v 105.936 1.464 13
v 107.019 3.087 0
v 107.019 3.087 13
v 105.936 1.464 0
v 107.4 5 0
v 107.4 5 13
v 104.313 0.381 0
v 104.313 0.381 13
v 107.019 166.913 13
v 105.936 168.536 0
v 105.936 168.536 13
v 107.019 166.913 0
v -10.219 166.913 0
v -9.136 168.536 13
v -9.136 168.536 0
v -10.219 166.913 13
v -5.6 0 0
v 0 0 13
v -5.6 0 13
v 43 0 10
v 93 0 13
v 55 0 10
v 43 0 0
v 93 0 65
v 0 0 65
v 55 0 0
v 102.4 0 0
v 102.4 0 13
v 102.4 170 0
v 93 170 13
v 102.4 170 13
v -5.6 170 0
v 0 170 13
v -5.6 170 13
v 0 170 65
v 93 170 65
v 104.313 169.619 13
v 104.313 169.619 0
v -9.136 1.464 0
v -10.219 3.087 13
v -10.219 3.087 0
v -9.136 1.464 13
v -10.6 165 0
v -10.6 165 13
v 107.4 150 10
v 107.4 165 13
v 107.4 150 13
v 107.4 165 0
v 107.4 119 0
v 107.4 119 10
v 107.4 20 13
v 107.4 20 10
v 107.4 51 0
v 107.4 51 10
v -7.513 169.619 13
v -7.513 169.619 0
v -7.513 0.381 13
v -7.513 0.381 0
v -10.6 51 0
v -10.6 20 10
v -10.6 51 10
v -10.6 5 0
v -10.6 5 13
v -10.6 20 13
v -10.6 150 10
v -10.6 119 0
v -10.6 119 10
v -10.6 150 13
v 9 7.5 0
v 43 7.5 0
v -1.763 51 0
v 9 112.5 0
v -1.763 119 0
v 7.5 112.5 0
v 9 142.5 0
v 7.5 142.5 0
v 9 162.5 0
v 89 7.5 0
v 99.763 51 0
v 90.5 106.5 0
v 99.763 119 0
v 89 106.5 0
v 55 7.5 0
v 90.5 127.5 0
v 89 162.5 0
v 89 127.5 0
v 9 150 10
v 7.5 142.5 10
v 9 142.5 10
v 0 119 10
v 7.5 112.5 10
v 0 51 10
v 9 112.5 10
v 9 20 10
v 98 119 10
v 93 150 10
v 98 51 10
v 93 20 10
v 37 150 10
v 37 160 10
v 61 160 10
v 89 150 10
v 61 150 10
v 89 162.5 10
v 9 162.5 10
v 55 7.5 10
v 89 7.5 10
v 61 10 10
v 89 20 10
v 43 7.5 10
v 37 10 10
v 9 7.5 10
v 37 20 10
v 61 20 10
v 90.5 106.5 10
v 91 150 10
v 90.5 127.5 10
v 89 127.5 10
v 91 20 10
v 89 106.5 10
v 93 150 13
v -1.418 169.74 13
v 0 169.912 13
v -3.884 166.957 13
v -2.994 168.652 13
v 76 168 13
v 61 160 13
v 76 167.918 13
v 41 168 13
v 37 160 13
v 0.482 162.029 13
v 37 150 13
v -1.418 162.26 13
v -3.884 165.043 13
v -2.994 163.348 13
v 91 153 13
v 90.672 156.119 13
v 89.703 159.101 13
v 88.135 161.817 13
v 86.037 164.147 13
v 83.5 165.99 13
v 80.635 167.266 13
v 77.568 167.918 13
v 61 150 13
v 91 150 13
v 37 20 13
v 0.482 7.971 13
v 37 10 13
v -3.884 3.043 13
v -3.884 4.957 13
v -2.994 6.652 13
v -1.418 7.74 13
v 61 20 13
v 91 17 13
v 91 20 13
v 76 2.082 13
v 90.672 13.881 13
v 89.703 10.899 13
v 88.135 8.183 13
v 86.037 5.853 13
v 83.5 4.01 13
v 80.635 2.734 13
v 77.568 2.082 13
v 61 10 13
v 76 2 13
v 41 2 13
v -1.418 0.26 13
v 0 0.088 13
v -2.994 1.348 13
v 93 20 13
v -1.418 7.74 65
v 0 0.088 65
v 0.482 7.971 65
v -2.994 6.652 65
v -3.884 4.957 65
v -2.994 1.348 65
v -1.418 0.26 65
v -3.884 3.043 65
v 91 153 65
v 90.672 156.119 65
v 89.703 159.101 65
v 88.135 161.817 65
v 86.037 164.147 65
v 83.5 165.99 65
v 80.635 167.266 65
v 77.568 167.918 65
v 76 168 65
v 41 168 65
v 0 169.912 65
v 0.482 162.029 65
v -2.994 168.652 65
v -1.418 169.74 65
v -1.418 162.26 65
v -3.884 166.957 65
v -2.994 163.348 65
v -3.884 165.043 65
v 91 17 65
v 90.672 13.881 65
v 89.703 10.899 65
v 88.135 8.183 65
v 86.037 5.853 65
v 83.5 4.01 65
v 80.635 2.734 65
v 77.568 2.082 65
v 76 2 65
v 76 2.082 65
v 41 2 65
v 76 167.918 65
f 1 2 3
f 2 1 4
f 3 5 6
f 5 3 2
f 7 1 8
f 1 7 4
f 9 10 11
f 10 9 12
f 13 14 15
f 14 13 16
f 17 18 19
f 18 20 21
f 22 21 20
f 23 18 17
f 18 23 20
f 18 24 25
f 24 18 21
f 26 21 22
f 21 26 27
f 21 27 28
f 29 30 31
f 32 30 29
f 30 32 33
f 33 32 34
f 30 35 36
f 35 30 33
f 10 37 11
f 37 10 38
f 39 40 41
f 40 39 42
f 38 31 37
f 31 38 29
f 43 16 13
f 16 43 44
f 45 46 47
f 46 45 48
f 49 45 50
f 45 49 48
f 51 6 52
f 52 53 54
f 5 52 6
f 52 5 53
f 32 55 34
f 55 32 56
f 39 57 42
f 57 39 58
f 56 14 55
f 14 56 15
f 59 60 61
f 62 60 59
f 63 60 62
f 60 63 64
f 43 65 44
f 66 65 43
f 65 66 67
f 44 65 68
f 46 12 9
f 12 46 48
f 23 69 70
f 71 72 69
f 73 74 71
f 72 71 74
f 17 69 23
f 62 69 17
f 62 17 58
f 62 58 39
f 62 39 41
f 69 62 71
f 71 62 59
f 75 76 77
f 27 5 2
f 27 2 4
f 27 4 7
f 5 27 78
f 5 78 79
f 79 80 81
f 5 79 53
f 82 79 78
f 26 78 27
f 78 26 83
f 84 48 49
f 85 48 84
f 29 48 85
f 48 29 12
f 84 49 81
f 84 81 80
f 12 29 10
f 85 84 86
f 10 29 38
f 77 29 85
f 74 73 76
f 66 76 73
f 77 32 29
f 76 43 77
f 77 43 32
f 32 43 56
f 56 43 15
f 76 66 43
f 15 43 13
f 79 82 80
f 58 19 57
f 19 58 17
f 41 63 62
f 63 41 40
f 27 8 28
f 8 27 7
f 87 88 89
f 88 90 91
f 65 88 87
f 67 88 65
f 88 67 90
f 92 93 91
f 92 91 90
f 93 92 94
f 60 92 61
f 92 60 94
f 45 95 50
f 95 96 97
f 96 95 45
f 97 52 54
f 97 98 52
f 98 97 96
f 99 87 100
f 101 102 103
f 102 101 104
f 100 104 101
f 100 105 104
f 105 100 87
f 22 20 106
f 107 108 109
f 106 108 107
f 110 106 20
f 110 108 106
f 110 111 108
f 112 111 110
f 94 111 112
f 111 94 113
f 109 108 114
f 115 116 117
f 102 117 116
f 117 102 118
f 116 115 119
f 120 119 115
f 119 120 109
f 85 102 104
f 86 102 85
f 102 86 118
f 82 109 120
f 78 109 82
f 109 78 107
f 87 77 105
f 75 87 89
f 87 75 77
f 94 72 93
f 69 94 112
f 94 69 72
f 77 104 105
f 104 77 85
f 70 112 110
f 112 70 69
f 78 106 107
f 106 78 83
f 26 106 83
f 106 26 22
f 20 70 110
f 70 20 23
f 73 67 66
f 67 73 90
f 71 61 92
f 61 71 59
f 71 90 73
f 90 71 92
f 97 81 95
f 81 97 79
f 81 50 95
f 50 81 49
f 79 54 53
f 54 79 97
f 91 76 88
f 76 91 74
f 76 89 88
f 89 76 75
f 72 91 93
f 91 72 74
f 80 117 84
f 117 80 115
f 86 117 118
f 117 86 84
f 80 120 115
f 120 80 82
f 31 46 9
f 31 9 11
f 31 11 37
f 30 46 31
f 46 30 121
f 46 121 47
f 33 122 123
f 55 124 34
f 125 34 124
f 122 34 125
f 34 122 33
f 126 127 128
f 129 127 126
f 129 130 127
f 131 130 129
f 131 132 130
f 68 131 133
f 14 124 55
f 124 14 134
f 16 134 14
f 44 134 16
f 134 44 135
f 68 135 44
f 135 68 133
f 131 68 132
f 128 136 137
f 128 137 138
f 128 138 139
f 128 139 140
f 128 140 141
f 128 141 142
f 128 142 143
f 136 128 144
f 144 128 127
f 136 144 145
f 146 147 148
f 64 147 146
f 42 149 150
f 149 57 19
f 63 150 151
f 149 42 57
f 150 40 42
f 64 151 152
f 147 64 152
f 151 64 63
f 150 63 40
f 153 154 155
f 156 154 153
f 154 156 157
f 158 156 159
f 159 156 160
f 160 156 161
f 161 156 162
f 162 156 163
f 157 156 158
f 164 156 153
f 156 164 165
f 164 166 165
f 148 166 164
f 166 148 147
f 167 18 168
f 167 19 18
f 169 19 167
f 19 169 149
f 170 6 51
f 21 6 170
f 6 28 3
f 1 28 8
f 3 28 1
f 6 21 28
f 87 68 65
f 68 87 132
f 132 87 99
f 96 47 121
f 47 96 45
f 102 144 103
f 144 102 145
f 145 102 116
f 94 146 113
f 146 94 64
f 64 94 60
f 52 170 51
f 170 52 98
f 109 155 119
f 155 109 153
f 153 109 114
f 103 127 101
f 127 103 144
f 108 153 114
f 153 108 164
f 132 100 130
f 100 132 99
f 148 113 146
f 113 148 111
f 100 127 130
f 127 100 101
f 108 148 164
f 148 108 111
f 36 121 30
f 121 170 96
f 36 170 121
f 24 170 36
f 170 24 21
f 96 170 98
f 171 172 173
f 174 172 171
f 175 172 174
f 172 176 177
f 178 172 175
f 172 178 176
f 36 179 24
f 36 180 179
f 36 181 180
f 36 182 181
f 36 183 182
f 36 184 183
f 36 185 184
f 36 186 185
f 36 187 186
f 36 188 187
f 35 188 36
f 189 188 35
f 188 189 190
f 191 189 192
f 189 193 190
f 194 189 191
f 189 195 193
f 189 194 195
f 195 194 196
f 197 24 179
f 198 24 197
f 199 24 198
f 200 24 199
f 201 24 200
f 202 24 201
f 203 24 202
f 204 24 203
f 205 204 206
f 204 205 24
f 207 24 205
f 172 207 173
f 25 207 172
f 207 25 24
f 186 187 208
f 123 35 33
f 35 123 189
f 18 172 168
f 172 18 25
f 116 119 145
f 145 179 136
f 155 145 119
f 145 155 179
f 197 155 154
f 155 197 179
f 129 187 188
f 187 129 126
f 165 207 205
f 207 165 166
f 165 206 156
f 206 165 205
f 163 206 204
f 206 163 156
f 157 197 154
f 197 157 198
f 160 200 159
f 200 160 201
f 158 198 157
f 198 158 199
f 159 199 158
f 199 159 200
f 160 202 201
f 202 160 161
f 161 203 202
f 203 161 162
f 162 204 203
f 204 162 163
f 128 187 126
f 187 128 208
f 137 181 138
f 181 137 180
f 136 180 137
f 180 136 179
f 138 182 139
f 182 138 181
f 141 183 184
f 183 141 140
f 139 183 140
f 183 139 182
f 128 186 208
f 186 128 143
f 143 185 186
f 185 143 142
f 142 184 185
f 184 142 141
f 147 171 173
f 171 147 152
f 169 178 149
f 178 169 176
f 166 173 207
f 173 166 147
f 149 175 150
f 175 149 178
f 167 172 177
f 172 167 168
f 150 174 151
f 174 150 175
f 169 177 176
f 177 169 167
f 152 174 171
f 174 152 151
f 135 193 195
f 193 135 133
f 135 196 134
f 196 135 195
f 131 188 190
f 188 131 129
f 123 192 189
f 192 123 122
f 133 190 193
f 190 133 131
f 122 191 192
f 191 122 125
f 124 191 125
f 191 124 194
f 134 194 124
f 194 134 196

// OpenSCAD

// Depth of the Sun Shade
Sunshade_Depth = 55; // [0:100]
 
// Width of Device
device_x = 80; // [75:85]

// Height of Device (Try 152 for Galaxy Note 3)
device_y = 155; // [150:160]

// Depth of Device (including back)
Device_Depth = 10; // [9:12]

module dont_customize(){}

outside_x = 118;
outside_xo = 10.6;
outside_cut_y = 68;
step = 1.5;

base_x = 98;
base_y = 170;
base_z = Device_Depth;

screen_z = 3;
screen_xo= 5;
screen_y = 130;

button_r_y1 = 35;
button_r_y2 = 56;

button_l_y1 = 20;
button_l_y2 = 50;

buttons_x = 1.5;

device_cut_y = 10;
device_cut_x = 24;

button_cut_xo = 16;

shade_z = Sunshade_Depth;
shade_w = 2;

usb_x = 12;

post_y = 2;
post_x = 6;
post_d = 8;

curve_r = 15;

big = 50;

buttons_ry1 = device_y-button_r_y1;
buttons_ry2 = device_y-button_r_y2;
buttons_ly1 = device_y-button_l_y1;
buttons_ly2 = device_y-button_l_y2;

rnd = 5;

// base block
difference(){

    translate([-outside_xo,0,0])roundcube([outside_x,base_y,base_z]);  

translate([(base_x-device_x)/2,(base_y-device_y)/2,0]) cube(size=[device_x,device_y,base_z]);
translate([(base_x-usb_x)/2,-base_y/2,0]) cube([usb_x,base_y,base_z]);

translate([0,(base_y-outside_cut_y)/2,0]) translate([0,0,base_z]) rotate([0,10,0]) translate([-big,0,-big]) cube([big,outside_cut_y,big]);

translate([base_x,(base_y-outside_cut_y)/2,0]) translate([0,0,base_z]) rotate([0,-10,0]) translate([0,0,-big]) cube([big,outside_cut_y,big]);

// buttons
translate([0,buttons_ly2+(base_y-device_y)/2,0]) translate([(base_x-device_x)/2-buttons_x,0,0]) cube([buttons_x,buttons_ly1-buttons_ly2,base_z]);
translate([device_x,buttons_ry2+(base_y-device_y)/2,0]) translate([(base_x-device_x)/2,0,0]) cube([buttons_x,buttons_ry1-buttons_ry2,base_z]);
}
// left and right tabs
translate([0,0,base_z]) difference(){
translate([-outside_xo,0,0]) roundcube([outside_x,base_y,screen_z]);
translate([-outside_xo,(base_y-screen_y)/2,0]) cube(size=[base_x+2*outside_xo,screen_y,screen_z]);
translate([(base_x-device_cut_x)/2,(base_y-screen_y)/2-device_cut_y,0]) cube(size=[device_cut_x,screen_y+2*device_cut_y,screen_z]);
}
// screen
translate([0,0,base_z]) difference(){
    translate([0,0,0]) cube([base_x-screen_xo,base_y,shade_z]);
    translate([0,shade_w,0]) cube([base_x-1*shade_w-screen_xo,base_y-2*shade_w,shade_z]);
 
}
// posts
translate([0,0,base_z]) 
{
    
hull(){
    translate([0,post_d/2,0]) cylinder(h=shade_z,d=post_d);
    translate([device_x/2,0,0]) cube([1,shade_w,shade_z]);
}
translate([0,base_y-post_d,0])
hull(){
    translate([0,post_d/2,0]) cylinder(h=shade_z,d=post_d);
    translate([device_x/2,post_d-shade_w,0]) cube([1,shade_w,shade_z]);
}

translate([base_x-screen_xo-curve_r-shade_w,0,0])
{
    difference(){
        cube([curve_r+shade_w,curve_r+shade_w,shade_z]);
translate([0,curve_r+shade_w,0]) cylinder(r=curve_r,h=shade_z);
}}
translate([base_x-screen_xo-curve_r-shade_w,base_y-curve_r-shade_w,0]){
    difference(){
        cube([curve_r+shade_w,curve_r+shade_w,shade_z]);
translate([0,0,0]) cylinder(r=curve_r,h=shade_z);
    }
}

}

module roundcube(v){
    translate([rnd,rnd,v[2]/4]) minkowski(){
    cube([v[0]-2*rnd,v[1]-2*rnd,v[2]/2]);
    cylinder(r=rnd,h=v[2]/2,center=true);
    }
}

    












